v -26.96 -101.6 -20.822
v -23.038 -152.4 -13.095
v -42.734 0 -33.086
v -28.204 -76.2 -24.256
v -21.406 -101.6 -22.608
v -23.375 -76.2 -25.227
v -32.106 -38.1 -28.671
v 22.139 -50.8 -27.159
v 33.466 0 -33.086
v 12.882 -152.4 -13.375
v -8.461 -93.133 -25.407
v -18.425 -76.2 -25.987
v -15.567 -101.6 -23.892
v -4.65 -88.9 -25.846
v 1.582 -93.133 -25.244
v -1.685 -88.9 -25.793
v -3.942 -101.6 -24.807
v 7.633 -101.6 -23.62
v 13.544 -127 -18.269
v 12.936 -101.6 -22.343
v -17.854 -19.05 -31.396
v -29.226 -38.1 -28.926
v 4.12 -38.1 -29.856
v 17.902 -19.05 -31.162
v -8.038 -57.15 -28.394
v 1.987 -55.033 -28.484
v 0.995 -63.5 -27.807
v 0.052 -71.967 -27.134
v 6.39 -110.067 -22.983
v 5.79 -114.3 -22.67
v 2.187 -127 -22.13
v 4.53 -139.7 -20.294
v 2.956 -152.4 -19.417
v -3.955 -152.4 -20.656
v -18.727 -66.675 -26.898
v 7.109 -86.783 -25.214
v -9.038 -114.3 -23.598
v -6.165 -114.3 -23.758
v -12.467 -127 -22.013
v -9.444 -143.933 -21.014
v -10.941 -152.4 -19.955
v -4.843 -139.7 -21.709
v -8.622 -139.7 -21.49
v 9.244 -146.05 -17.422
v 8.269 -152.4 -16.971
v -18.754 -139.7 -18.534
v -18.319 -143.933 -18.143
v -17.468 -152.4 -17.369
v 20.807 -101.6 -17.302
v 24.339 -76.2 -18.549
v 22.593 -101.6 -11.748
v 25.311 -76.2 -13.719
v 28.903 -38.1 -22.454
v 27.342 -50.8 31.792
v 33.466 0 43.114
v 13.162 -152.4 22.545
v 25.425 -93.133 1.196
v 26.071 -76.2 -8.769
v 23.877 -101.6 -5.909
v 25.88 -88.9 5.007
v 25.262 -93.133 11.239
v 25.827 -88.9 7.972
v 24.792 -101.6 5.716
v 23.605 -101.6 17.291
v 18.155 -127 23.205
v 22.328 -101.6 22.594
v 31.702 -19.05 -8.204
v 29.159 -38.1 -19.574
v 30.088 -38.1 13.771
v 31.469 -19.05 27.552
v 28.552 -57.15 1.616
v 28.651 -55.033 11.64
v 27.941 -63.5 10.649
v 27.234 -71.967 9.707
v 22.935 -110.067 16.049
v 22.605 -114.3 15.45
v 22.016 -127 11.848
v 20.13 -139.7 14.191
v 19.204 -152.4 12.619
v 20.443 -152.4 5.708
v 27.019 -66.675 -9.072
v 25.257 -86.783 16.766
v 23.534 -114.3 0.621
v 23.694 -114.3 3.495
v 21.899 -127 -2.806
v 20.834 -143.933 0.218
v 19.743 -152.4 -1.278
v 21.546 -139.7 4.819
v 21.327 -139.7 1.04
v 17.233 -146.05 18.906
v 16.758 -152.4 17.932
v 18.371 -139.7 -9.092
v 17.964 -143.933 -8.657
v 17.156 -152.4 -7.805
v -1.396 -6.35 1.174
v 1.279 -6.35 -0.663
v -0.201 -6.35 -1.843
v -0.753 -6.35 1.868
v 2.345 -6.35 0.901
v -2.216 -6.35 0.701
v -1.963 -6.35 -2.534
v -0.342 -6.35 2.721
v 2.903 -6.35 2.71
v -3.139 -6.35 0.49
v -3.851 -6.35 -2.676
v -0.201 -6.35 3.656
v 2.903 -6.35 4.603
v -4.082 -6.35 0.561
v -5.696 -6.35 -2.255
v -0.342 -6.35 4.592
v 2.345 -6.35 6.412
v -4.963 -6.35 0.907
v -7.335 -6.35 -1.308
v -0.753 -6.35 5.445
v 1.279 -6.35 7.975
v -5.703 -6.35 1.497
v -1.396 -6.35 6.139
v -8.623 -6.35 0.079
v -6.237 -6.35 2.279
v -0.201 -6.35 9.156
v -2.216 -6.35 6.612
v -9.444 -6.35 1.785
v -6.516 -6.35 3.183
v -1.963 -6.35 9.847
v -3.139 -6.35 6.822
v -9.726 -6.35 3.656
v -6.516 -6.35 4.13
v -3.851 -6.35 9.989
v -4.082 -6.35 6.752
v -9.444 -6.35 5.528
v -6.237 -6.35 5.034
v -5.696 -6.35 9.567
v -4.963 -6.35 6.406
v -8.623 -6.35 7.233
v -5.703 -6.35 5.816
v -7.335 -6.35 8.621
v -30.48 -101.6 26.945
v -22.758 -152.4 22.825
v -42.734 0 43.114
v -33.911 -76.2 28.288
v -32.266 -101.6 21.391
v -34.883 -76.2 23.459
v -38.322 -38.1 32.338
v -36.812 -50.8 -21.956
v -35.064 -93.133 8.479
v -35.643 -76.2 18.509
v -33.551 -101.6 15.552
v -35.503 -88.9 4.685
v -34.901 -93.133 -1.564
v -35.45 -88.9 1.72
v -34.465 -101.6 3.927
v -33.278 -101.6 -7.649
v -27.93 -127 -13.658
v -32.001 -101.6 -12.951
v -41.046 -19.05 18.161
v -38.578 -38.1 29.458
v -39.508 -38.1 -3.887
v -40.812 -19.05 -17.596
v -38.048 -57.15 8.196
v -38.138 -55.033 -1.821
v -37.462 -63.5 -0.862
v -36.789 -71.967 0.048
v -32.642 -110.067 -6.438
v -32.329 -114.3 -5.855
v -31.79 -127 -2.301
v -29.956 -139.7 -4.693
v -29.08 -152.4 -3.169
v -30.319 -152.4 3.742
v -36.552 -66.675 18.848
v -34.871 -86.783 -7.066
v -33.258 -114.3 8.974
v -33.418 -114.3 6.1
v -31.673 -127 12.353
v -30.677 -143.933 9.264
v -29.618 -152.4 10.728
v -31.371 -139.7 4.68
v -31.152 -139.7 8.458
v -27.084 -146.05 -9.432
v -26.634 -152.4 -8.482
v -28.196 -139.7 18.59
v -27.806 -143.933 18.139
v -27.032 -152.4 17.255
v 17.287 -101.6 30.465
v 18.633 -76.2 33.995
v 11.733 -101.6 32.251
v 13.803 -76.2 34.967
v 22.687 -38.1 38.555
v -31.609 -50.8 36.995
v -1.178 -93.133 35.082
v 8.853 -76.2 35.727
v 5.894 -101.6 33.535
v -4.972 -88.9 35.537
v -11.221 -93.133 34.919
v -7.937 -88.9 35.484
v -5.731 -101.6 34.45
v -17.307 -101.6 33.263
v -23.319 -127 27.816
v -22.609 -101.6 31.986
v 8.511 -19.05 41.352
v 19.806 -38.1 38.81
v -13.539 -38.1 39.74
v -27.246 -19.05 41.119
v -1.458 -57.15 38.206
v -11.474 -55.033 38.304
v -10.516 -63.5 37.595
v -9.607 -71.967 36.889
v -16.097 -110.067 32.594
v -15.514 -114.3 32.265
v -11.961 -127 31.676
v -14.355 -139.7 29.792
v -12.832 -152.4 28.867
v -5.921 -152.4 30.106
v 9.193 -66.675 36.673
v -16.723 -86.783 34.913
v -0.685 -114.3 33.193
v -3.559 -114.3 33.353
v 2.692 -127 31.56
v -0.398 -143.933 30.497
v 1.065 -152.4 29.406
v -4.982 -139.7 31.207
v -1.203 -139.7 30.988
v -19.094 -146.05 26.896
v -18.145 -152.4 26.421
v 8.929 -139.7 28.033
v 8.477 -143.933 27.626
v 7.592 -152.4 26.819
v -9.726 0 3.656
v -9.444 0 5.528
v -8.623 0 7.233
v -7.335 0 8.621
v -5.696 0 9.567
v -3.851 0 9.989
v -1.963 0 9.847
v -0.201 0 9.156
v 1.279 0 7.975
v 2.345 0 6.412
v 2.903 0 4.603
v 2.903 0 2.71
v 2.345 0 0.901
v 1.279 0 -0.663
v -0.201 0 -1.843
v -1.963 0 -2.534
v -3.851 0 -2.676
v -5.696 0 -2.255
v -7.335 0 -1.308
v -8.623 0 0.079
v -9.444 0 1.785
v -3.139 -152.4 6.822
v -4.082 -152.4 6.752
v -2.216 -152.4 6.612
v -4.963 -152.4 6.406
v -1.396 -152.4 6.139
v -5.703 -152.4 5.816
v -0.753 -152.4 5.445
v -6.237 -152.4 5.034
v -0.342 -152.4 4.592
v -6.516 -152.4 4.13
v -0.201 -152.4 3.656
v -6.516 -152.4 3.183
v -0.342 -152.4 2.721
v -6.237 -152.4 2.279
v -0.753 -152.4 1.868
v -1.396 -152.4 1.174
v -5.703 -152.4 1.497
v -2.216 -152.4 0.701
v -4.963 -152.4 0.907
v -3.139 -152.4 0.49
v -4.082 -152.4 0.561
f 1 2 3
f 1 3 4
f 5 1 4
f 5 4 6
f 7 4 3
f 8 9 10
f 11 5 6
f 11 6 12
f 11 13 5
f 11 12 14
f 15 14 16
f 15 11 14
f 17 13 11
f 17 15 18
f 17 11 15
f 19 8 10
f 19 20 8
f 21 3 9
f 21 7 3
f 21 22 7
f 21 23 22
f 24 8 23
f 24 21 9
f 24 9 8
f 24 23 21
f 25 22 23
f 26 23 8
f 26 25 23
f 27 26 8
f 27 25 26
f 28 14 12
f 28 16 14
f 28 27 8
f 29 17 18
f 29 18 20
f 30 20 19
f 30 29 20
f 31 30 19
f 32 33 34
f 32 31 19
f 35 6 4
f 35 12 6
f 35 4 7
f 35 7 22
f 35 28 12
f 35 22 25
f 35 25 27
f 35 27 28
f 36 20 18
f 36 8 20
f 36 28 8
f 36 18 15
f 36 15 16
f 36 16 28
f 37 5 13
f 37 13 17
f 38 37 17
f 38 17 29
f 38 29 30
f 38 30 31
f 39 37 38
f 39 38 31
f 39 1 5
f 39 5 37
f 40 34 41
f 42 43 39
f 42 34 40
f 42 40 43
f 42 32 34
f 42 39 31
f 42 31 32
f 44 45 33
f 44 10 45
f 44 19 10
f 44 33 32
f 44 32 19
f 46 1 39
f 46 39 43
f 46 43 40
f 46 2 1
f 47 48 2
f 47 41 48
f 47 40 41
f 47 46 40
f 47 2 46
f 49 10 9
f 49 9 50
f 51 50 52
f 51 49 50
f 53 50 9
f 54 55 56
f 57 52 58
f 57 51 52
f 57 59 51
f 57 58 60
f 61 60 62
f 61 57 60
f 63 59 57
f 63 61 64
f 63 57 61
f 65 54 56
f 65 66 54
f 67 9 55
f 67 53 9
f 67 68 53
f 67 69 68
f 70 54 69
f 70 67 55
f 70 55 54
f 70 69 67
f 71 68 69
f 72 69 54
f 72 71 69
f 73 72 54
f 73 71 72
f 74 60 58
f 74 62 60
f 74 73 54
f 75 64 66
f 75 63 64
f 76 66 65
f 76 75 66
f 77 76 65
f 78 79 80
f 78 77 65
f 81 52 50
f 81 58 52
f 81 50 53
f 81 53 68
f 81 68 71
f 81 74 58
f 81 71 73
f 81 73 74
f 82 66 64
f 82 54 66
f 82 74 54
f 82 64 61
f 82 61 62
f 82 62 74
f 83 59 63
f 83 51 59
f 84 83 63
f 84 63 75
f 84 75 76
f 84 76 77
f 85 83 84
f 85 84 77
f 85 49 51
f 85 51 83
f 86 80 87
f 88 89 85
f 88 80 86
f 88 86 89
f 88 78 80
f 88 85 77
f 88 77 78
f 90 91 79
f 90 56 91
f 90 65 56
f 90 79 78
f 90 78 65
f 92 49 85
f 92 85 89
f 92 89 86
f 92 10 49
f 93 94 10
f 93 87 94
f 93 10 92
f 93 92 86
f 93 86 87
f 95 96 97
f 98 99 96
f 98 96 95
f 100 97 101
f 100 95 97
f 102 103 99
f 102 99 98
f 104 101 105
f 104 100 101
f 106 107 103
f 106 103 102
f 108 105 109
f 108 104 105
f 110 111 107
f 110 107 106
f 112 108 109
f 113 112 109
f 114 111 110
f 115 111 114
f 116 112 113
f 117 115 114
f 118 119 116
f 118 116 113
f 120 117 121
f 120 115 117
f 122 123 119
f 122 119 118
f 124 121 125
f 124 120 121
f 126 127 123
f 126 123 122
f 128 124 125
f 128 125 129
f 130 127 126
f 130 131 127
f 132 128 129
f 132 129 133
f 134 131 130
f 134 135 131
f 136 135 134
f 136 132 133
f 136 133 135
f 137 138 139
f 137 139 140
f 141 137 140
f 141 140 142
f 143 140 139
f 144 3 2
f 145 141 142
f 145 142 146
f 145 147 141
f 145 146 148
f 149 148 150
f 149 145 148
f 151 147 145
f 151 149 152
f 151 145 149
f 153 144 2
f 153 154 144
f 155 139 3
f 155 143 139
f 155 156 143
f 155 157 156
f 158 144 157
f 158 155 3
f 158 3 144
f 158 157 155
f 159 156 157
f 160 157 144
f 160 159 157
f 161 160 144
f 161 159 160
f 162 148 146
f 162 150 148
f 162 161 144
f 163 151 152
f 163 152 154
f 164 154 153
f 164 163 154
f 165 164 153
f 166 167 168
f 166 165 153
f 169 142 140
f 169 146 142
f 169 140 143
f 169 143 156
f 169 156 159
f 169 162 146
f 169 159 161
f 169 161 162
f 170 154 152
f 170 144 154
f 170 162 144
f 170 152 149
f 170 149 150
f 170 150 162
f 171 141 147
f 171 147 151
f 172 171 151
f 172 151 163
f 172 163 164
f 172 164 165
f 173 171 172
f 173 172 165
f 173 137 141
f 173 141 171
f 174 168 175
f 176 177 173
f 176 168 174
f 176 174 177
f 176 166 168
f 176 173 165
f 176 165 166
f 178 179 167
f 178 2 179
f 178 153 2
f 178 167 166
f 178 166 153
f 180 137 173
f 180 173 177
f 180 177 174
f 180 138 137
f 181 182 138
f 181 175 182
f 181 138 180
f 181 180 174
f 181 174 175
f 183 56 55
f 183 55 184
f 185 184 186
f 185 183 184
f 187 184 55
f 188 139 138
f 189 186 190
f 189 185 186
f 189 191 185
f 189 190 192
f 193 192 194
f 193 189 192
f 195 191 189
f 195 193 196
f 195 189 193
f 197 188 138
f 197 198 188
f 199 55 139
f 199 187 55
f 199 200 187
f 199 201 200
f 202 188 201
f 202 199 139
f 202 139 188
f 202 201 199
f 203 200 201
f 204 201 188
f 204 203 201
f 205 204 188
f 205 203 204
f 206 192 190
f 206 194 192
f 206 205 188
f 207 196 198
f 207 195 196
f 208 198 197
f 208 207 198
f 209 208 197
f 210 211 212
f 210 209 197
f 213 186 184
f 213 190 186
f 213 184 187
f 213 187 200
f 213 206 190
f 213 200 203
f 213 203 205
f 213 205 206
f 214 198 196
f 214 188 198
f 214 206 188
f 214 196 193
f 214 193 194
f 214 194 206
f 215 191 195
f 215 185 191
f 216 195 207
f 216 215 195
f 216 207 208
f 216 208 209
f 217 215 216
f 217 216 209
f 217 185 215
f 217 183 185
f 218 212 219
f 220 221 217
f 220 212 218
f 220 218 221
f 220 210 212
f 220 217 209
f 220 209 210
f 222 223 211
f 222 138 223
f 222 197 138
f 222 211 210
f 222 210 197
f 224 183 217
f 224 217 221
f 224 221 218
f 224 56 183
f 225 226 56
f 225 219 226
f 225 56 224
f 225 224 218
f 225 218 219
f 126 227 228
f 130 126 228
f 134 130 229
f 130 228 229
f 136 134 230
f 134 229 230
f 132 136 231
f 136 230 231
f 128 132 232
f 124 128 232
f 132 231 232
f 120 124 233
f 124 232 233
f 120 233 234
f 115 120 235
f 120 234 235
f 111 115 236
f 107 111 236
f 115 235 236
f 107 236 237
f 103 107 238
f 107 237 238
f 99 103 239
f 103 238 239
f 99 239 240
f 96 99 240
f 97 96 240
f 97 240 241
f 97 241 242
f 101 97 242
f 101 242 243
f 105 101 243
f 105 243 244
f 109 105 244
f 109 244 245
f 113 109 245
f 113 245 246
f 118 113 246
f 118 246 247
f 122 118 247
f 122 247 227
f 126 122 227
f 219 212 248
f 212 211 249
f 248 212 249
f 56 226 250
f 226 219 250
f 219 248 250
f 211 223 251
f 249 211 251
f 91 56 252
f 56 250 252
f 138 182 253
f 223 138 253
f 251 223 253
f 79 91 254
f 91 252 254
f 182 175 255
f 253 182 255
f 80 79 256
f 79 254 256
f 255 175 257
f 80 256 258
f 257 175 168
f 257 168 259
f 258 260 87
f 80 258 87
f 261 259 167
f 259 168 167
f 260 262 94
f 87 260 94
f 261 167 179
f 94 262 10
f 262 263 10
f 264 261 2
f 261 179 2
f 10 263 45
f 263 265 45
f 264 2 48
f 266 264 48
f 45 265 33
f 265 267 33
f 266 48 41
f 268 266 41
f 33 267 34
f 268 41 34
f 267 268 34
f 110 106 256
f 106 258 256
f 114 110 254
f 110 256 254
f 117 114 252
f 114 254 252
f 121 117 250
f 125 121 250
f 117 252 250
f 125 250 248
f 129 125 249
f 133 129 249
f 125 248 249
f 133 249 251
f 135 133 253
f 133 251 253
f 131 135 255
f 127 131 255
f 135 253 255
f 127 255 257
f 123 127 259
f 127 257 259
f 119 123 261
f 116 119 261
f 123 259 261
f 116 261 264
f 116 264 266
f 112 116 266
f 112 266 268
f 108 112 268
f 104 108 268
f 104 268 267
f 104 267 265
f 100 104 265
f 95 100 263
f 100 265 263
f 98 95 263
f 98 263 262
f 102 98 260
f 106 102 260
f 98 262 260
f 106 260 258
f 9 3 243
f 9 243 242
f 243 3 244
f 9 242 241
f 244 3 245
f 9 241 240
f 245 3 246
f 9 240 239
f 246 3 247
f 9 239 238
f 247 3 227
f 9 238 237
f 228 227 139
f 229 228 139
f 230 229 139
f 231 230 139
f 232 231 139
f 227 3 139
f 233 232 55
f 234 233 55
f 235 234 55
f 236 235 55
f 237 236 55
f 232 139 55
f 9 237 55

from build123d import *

# Parameters (mm, degrees)
F0_W           = 76.2
F0_H           = 76.2
F5_D           = 6.35
F5_CBORE_D     = 12.7
F5_CBORE_DEPTH = 6.35


# Not quite as in the source:
# - the arcs of a loft's sections are written as splines that run evenly, so that the points pair up as in the source's solid


with BuildPart() as f3:
    # F0 (on Front) → F3 section 0
    with BuildSketch(Plane.XZ):
        with Locations((-4.6337489039, 5.0143152279)):
            Rectangle(F0_W, F0_H)
    # F2 (on offset) → F3 section 1
    with BuildSketch(Plane.XZ.offset(152.4)):
        with BuildLine():
            add(Edge.make_bspline(
                [(-22.7580046449, 22.8249401439), (-23.9426377251, 21.6586189854), (-25.0123717458, 20.375653377), (-26.8810371807, 17.6256112299), (-27.6799223885, 16.1586026914), (-28.976175333, 13.0968432916), (-29.4735110173, 11.5021681383), (-30.1475371977, 8.2463531825), (-30.3242110272, 6.5852938864), (-30.3501079954, 3.2605425174), (-30.1993304937, 1.5969326556), (-29.5761030438, -1.6689867959), (-29.1036685059, -3.2712156294), (-27.8552669191, -6.3527957105), (-27.0793307394, -7.8320707601), (-25.2537303887, -10.6108880765), (-24.2041113593, -11.9103616316), (-23.0377902009, -13.0949947119)],
                knots=[0, 0, 0, 0, 0.125, 0.125, 0.25, 0.25, 0.375, 0.375, 0.5, 0.5, 0.625, 0.625, 0.75, 0.75, 0.875, 0.875, 1, 1, 1, 1], degree=3))
            add(Edge.make_bspline(
                [(-23.0377902009, -13.0949947119), (-21.8714690424, -14.2796277922), (-20.588503434, -15.3493618129), (-17.8384612869, -17.2180272478), (-16.3714527484, -18.0169124555), (-13.3096933486, -19.3131654), (-11.7150181953, -19.8105010844), (-8.4592032395, -20.4845272648), (-6.7981439434, -20.6612010942), (-3.4733925744, -20.6870980624), (-1.8097827126, -20.5363205608), (1.4561367389, -19.9130931108), (3.0583655724, -19.440658573), (6.1399456535, -18.1922569862), (7.6192207031, -17.4163208065), (10.3980380195, -15.5907204558), (11.6975115746, -14.5411014264), (12.8821446549, -13.3747802679)],
                knots=[0, 0, 0, 0, 0.125, 0.125, 0.25, 0.25, 0.375, 0.375, 0.5, 0.5, 0.625, 0.625, 0.75, 0.75, 0.875, 0.875, 1, 1, 1, 1], degree=3))
            add(Edge.make_bspline(
                [(12.8821446549, -13.3747802679), (14.0667777352, -12.2084591095), (15.1365117559, -10.9254935011), (17.0051771908, -8.175451354), (17.8040623985, -6.7084428155), (19.100315343, -3.6466834156), (19.5976510274, -2.0520082624), (20.2716772078, 1.2038066934), (20.4483510372, 2.8648659896), (20.4742480054, 6.1896173585), (20.3234705038, 7.8532272203), (19.7002430538, 11.1191466719), (19.227808516, 12.7213755053), (17.9794069292, 15.8029555865), (17.2034707495, 17.282230636), (15.3778703988, 20.0610479524), (14.3282513694, 21.3605215076), (13.1619302109, 22.5451545878)],
                knots=[0, 0, 0, 0, 0.125, 0.125, 0.25, 0.25, 0.375, 0.375, 0.5, 0.5, 0.625, 0.625, 0.75, 0.75, 0.875, 0.875, 1, 1, 1, 1], degree=3))
            add(Edge.make_bspline(
                [(13.1619302109, 22.5451545878), (11.9956090524, 23.7297876681), (10.7126434441, 24.7995216888), (7.962601297, 26.6681871237), (6.4955927584, 27.4670723315), (3.4338333586, 28.763325276), (1.8391582054, 29.2606609603), (-1.4166567504, 29.9346871407), (-3.0777160466, 30.1113609702), (-6.4024674155, 30.1372579384), (-8.0660772773, 29.9864804367), (-11.3319967289, 29.3632529868), (-12.9342255623, 28.8908184489), (-16.0158056435, 27.6424168621), (-17.495080693, 26.8664806824), (-20.2738980095, 25.0408803317), (-21.5733715646, 23.9912613023), (-22.7580046449, 22.8249401439)],
                knots=[0, 0, 0, 0, 0.125, 0.125, 0.25, 0.25, 0.375, 0.375, 0.5, 0.5, 0.625, 0.625, 0.75, 0.75, 0.875, 0.875, 1, 1, 1, 1], degree=3))
        make_face()
    loft(ruled=True)

    # F5 (through all)
    with Locations(Plane(origin=(0, 0, 0), x_dir=(-1, 0, 0), z_dir=(0, 1, 0))):
        with Locations((3.3759707585, 3.656350309)):
            CounterBoreHole(F5_D / 2, F5_CBORE_D / 2, F5_CBORE_DEPTH)


solid = f3.part
